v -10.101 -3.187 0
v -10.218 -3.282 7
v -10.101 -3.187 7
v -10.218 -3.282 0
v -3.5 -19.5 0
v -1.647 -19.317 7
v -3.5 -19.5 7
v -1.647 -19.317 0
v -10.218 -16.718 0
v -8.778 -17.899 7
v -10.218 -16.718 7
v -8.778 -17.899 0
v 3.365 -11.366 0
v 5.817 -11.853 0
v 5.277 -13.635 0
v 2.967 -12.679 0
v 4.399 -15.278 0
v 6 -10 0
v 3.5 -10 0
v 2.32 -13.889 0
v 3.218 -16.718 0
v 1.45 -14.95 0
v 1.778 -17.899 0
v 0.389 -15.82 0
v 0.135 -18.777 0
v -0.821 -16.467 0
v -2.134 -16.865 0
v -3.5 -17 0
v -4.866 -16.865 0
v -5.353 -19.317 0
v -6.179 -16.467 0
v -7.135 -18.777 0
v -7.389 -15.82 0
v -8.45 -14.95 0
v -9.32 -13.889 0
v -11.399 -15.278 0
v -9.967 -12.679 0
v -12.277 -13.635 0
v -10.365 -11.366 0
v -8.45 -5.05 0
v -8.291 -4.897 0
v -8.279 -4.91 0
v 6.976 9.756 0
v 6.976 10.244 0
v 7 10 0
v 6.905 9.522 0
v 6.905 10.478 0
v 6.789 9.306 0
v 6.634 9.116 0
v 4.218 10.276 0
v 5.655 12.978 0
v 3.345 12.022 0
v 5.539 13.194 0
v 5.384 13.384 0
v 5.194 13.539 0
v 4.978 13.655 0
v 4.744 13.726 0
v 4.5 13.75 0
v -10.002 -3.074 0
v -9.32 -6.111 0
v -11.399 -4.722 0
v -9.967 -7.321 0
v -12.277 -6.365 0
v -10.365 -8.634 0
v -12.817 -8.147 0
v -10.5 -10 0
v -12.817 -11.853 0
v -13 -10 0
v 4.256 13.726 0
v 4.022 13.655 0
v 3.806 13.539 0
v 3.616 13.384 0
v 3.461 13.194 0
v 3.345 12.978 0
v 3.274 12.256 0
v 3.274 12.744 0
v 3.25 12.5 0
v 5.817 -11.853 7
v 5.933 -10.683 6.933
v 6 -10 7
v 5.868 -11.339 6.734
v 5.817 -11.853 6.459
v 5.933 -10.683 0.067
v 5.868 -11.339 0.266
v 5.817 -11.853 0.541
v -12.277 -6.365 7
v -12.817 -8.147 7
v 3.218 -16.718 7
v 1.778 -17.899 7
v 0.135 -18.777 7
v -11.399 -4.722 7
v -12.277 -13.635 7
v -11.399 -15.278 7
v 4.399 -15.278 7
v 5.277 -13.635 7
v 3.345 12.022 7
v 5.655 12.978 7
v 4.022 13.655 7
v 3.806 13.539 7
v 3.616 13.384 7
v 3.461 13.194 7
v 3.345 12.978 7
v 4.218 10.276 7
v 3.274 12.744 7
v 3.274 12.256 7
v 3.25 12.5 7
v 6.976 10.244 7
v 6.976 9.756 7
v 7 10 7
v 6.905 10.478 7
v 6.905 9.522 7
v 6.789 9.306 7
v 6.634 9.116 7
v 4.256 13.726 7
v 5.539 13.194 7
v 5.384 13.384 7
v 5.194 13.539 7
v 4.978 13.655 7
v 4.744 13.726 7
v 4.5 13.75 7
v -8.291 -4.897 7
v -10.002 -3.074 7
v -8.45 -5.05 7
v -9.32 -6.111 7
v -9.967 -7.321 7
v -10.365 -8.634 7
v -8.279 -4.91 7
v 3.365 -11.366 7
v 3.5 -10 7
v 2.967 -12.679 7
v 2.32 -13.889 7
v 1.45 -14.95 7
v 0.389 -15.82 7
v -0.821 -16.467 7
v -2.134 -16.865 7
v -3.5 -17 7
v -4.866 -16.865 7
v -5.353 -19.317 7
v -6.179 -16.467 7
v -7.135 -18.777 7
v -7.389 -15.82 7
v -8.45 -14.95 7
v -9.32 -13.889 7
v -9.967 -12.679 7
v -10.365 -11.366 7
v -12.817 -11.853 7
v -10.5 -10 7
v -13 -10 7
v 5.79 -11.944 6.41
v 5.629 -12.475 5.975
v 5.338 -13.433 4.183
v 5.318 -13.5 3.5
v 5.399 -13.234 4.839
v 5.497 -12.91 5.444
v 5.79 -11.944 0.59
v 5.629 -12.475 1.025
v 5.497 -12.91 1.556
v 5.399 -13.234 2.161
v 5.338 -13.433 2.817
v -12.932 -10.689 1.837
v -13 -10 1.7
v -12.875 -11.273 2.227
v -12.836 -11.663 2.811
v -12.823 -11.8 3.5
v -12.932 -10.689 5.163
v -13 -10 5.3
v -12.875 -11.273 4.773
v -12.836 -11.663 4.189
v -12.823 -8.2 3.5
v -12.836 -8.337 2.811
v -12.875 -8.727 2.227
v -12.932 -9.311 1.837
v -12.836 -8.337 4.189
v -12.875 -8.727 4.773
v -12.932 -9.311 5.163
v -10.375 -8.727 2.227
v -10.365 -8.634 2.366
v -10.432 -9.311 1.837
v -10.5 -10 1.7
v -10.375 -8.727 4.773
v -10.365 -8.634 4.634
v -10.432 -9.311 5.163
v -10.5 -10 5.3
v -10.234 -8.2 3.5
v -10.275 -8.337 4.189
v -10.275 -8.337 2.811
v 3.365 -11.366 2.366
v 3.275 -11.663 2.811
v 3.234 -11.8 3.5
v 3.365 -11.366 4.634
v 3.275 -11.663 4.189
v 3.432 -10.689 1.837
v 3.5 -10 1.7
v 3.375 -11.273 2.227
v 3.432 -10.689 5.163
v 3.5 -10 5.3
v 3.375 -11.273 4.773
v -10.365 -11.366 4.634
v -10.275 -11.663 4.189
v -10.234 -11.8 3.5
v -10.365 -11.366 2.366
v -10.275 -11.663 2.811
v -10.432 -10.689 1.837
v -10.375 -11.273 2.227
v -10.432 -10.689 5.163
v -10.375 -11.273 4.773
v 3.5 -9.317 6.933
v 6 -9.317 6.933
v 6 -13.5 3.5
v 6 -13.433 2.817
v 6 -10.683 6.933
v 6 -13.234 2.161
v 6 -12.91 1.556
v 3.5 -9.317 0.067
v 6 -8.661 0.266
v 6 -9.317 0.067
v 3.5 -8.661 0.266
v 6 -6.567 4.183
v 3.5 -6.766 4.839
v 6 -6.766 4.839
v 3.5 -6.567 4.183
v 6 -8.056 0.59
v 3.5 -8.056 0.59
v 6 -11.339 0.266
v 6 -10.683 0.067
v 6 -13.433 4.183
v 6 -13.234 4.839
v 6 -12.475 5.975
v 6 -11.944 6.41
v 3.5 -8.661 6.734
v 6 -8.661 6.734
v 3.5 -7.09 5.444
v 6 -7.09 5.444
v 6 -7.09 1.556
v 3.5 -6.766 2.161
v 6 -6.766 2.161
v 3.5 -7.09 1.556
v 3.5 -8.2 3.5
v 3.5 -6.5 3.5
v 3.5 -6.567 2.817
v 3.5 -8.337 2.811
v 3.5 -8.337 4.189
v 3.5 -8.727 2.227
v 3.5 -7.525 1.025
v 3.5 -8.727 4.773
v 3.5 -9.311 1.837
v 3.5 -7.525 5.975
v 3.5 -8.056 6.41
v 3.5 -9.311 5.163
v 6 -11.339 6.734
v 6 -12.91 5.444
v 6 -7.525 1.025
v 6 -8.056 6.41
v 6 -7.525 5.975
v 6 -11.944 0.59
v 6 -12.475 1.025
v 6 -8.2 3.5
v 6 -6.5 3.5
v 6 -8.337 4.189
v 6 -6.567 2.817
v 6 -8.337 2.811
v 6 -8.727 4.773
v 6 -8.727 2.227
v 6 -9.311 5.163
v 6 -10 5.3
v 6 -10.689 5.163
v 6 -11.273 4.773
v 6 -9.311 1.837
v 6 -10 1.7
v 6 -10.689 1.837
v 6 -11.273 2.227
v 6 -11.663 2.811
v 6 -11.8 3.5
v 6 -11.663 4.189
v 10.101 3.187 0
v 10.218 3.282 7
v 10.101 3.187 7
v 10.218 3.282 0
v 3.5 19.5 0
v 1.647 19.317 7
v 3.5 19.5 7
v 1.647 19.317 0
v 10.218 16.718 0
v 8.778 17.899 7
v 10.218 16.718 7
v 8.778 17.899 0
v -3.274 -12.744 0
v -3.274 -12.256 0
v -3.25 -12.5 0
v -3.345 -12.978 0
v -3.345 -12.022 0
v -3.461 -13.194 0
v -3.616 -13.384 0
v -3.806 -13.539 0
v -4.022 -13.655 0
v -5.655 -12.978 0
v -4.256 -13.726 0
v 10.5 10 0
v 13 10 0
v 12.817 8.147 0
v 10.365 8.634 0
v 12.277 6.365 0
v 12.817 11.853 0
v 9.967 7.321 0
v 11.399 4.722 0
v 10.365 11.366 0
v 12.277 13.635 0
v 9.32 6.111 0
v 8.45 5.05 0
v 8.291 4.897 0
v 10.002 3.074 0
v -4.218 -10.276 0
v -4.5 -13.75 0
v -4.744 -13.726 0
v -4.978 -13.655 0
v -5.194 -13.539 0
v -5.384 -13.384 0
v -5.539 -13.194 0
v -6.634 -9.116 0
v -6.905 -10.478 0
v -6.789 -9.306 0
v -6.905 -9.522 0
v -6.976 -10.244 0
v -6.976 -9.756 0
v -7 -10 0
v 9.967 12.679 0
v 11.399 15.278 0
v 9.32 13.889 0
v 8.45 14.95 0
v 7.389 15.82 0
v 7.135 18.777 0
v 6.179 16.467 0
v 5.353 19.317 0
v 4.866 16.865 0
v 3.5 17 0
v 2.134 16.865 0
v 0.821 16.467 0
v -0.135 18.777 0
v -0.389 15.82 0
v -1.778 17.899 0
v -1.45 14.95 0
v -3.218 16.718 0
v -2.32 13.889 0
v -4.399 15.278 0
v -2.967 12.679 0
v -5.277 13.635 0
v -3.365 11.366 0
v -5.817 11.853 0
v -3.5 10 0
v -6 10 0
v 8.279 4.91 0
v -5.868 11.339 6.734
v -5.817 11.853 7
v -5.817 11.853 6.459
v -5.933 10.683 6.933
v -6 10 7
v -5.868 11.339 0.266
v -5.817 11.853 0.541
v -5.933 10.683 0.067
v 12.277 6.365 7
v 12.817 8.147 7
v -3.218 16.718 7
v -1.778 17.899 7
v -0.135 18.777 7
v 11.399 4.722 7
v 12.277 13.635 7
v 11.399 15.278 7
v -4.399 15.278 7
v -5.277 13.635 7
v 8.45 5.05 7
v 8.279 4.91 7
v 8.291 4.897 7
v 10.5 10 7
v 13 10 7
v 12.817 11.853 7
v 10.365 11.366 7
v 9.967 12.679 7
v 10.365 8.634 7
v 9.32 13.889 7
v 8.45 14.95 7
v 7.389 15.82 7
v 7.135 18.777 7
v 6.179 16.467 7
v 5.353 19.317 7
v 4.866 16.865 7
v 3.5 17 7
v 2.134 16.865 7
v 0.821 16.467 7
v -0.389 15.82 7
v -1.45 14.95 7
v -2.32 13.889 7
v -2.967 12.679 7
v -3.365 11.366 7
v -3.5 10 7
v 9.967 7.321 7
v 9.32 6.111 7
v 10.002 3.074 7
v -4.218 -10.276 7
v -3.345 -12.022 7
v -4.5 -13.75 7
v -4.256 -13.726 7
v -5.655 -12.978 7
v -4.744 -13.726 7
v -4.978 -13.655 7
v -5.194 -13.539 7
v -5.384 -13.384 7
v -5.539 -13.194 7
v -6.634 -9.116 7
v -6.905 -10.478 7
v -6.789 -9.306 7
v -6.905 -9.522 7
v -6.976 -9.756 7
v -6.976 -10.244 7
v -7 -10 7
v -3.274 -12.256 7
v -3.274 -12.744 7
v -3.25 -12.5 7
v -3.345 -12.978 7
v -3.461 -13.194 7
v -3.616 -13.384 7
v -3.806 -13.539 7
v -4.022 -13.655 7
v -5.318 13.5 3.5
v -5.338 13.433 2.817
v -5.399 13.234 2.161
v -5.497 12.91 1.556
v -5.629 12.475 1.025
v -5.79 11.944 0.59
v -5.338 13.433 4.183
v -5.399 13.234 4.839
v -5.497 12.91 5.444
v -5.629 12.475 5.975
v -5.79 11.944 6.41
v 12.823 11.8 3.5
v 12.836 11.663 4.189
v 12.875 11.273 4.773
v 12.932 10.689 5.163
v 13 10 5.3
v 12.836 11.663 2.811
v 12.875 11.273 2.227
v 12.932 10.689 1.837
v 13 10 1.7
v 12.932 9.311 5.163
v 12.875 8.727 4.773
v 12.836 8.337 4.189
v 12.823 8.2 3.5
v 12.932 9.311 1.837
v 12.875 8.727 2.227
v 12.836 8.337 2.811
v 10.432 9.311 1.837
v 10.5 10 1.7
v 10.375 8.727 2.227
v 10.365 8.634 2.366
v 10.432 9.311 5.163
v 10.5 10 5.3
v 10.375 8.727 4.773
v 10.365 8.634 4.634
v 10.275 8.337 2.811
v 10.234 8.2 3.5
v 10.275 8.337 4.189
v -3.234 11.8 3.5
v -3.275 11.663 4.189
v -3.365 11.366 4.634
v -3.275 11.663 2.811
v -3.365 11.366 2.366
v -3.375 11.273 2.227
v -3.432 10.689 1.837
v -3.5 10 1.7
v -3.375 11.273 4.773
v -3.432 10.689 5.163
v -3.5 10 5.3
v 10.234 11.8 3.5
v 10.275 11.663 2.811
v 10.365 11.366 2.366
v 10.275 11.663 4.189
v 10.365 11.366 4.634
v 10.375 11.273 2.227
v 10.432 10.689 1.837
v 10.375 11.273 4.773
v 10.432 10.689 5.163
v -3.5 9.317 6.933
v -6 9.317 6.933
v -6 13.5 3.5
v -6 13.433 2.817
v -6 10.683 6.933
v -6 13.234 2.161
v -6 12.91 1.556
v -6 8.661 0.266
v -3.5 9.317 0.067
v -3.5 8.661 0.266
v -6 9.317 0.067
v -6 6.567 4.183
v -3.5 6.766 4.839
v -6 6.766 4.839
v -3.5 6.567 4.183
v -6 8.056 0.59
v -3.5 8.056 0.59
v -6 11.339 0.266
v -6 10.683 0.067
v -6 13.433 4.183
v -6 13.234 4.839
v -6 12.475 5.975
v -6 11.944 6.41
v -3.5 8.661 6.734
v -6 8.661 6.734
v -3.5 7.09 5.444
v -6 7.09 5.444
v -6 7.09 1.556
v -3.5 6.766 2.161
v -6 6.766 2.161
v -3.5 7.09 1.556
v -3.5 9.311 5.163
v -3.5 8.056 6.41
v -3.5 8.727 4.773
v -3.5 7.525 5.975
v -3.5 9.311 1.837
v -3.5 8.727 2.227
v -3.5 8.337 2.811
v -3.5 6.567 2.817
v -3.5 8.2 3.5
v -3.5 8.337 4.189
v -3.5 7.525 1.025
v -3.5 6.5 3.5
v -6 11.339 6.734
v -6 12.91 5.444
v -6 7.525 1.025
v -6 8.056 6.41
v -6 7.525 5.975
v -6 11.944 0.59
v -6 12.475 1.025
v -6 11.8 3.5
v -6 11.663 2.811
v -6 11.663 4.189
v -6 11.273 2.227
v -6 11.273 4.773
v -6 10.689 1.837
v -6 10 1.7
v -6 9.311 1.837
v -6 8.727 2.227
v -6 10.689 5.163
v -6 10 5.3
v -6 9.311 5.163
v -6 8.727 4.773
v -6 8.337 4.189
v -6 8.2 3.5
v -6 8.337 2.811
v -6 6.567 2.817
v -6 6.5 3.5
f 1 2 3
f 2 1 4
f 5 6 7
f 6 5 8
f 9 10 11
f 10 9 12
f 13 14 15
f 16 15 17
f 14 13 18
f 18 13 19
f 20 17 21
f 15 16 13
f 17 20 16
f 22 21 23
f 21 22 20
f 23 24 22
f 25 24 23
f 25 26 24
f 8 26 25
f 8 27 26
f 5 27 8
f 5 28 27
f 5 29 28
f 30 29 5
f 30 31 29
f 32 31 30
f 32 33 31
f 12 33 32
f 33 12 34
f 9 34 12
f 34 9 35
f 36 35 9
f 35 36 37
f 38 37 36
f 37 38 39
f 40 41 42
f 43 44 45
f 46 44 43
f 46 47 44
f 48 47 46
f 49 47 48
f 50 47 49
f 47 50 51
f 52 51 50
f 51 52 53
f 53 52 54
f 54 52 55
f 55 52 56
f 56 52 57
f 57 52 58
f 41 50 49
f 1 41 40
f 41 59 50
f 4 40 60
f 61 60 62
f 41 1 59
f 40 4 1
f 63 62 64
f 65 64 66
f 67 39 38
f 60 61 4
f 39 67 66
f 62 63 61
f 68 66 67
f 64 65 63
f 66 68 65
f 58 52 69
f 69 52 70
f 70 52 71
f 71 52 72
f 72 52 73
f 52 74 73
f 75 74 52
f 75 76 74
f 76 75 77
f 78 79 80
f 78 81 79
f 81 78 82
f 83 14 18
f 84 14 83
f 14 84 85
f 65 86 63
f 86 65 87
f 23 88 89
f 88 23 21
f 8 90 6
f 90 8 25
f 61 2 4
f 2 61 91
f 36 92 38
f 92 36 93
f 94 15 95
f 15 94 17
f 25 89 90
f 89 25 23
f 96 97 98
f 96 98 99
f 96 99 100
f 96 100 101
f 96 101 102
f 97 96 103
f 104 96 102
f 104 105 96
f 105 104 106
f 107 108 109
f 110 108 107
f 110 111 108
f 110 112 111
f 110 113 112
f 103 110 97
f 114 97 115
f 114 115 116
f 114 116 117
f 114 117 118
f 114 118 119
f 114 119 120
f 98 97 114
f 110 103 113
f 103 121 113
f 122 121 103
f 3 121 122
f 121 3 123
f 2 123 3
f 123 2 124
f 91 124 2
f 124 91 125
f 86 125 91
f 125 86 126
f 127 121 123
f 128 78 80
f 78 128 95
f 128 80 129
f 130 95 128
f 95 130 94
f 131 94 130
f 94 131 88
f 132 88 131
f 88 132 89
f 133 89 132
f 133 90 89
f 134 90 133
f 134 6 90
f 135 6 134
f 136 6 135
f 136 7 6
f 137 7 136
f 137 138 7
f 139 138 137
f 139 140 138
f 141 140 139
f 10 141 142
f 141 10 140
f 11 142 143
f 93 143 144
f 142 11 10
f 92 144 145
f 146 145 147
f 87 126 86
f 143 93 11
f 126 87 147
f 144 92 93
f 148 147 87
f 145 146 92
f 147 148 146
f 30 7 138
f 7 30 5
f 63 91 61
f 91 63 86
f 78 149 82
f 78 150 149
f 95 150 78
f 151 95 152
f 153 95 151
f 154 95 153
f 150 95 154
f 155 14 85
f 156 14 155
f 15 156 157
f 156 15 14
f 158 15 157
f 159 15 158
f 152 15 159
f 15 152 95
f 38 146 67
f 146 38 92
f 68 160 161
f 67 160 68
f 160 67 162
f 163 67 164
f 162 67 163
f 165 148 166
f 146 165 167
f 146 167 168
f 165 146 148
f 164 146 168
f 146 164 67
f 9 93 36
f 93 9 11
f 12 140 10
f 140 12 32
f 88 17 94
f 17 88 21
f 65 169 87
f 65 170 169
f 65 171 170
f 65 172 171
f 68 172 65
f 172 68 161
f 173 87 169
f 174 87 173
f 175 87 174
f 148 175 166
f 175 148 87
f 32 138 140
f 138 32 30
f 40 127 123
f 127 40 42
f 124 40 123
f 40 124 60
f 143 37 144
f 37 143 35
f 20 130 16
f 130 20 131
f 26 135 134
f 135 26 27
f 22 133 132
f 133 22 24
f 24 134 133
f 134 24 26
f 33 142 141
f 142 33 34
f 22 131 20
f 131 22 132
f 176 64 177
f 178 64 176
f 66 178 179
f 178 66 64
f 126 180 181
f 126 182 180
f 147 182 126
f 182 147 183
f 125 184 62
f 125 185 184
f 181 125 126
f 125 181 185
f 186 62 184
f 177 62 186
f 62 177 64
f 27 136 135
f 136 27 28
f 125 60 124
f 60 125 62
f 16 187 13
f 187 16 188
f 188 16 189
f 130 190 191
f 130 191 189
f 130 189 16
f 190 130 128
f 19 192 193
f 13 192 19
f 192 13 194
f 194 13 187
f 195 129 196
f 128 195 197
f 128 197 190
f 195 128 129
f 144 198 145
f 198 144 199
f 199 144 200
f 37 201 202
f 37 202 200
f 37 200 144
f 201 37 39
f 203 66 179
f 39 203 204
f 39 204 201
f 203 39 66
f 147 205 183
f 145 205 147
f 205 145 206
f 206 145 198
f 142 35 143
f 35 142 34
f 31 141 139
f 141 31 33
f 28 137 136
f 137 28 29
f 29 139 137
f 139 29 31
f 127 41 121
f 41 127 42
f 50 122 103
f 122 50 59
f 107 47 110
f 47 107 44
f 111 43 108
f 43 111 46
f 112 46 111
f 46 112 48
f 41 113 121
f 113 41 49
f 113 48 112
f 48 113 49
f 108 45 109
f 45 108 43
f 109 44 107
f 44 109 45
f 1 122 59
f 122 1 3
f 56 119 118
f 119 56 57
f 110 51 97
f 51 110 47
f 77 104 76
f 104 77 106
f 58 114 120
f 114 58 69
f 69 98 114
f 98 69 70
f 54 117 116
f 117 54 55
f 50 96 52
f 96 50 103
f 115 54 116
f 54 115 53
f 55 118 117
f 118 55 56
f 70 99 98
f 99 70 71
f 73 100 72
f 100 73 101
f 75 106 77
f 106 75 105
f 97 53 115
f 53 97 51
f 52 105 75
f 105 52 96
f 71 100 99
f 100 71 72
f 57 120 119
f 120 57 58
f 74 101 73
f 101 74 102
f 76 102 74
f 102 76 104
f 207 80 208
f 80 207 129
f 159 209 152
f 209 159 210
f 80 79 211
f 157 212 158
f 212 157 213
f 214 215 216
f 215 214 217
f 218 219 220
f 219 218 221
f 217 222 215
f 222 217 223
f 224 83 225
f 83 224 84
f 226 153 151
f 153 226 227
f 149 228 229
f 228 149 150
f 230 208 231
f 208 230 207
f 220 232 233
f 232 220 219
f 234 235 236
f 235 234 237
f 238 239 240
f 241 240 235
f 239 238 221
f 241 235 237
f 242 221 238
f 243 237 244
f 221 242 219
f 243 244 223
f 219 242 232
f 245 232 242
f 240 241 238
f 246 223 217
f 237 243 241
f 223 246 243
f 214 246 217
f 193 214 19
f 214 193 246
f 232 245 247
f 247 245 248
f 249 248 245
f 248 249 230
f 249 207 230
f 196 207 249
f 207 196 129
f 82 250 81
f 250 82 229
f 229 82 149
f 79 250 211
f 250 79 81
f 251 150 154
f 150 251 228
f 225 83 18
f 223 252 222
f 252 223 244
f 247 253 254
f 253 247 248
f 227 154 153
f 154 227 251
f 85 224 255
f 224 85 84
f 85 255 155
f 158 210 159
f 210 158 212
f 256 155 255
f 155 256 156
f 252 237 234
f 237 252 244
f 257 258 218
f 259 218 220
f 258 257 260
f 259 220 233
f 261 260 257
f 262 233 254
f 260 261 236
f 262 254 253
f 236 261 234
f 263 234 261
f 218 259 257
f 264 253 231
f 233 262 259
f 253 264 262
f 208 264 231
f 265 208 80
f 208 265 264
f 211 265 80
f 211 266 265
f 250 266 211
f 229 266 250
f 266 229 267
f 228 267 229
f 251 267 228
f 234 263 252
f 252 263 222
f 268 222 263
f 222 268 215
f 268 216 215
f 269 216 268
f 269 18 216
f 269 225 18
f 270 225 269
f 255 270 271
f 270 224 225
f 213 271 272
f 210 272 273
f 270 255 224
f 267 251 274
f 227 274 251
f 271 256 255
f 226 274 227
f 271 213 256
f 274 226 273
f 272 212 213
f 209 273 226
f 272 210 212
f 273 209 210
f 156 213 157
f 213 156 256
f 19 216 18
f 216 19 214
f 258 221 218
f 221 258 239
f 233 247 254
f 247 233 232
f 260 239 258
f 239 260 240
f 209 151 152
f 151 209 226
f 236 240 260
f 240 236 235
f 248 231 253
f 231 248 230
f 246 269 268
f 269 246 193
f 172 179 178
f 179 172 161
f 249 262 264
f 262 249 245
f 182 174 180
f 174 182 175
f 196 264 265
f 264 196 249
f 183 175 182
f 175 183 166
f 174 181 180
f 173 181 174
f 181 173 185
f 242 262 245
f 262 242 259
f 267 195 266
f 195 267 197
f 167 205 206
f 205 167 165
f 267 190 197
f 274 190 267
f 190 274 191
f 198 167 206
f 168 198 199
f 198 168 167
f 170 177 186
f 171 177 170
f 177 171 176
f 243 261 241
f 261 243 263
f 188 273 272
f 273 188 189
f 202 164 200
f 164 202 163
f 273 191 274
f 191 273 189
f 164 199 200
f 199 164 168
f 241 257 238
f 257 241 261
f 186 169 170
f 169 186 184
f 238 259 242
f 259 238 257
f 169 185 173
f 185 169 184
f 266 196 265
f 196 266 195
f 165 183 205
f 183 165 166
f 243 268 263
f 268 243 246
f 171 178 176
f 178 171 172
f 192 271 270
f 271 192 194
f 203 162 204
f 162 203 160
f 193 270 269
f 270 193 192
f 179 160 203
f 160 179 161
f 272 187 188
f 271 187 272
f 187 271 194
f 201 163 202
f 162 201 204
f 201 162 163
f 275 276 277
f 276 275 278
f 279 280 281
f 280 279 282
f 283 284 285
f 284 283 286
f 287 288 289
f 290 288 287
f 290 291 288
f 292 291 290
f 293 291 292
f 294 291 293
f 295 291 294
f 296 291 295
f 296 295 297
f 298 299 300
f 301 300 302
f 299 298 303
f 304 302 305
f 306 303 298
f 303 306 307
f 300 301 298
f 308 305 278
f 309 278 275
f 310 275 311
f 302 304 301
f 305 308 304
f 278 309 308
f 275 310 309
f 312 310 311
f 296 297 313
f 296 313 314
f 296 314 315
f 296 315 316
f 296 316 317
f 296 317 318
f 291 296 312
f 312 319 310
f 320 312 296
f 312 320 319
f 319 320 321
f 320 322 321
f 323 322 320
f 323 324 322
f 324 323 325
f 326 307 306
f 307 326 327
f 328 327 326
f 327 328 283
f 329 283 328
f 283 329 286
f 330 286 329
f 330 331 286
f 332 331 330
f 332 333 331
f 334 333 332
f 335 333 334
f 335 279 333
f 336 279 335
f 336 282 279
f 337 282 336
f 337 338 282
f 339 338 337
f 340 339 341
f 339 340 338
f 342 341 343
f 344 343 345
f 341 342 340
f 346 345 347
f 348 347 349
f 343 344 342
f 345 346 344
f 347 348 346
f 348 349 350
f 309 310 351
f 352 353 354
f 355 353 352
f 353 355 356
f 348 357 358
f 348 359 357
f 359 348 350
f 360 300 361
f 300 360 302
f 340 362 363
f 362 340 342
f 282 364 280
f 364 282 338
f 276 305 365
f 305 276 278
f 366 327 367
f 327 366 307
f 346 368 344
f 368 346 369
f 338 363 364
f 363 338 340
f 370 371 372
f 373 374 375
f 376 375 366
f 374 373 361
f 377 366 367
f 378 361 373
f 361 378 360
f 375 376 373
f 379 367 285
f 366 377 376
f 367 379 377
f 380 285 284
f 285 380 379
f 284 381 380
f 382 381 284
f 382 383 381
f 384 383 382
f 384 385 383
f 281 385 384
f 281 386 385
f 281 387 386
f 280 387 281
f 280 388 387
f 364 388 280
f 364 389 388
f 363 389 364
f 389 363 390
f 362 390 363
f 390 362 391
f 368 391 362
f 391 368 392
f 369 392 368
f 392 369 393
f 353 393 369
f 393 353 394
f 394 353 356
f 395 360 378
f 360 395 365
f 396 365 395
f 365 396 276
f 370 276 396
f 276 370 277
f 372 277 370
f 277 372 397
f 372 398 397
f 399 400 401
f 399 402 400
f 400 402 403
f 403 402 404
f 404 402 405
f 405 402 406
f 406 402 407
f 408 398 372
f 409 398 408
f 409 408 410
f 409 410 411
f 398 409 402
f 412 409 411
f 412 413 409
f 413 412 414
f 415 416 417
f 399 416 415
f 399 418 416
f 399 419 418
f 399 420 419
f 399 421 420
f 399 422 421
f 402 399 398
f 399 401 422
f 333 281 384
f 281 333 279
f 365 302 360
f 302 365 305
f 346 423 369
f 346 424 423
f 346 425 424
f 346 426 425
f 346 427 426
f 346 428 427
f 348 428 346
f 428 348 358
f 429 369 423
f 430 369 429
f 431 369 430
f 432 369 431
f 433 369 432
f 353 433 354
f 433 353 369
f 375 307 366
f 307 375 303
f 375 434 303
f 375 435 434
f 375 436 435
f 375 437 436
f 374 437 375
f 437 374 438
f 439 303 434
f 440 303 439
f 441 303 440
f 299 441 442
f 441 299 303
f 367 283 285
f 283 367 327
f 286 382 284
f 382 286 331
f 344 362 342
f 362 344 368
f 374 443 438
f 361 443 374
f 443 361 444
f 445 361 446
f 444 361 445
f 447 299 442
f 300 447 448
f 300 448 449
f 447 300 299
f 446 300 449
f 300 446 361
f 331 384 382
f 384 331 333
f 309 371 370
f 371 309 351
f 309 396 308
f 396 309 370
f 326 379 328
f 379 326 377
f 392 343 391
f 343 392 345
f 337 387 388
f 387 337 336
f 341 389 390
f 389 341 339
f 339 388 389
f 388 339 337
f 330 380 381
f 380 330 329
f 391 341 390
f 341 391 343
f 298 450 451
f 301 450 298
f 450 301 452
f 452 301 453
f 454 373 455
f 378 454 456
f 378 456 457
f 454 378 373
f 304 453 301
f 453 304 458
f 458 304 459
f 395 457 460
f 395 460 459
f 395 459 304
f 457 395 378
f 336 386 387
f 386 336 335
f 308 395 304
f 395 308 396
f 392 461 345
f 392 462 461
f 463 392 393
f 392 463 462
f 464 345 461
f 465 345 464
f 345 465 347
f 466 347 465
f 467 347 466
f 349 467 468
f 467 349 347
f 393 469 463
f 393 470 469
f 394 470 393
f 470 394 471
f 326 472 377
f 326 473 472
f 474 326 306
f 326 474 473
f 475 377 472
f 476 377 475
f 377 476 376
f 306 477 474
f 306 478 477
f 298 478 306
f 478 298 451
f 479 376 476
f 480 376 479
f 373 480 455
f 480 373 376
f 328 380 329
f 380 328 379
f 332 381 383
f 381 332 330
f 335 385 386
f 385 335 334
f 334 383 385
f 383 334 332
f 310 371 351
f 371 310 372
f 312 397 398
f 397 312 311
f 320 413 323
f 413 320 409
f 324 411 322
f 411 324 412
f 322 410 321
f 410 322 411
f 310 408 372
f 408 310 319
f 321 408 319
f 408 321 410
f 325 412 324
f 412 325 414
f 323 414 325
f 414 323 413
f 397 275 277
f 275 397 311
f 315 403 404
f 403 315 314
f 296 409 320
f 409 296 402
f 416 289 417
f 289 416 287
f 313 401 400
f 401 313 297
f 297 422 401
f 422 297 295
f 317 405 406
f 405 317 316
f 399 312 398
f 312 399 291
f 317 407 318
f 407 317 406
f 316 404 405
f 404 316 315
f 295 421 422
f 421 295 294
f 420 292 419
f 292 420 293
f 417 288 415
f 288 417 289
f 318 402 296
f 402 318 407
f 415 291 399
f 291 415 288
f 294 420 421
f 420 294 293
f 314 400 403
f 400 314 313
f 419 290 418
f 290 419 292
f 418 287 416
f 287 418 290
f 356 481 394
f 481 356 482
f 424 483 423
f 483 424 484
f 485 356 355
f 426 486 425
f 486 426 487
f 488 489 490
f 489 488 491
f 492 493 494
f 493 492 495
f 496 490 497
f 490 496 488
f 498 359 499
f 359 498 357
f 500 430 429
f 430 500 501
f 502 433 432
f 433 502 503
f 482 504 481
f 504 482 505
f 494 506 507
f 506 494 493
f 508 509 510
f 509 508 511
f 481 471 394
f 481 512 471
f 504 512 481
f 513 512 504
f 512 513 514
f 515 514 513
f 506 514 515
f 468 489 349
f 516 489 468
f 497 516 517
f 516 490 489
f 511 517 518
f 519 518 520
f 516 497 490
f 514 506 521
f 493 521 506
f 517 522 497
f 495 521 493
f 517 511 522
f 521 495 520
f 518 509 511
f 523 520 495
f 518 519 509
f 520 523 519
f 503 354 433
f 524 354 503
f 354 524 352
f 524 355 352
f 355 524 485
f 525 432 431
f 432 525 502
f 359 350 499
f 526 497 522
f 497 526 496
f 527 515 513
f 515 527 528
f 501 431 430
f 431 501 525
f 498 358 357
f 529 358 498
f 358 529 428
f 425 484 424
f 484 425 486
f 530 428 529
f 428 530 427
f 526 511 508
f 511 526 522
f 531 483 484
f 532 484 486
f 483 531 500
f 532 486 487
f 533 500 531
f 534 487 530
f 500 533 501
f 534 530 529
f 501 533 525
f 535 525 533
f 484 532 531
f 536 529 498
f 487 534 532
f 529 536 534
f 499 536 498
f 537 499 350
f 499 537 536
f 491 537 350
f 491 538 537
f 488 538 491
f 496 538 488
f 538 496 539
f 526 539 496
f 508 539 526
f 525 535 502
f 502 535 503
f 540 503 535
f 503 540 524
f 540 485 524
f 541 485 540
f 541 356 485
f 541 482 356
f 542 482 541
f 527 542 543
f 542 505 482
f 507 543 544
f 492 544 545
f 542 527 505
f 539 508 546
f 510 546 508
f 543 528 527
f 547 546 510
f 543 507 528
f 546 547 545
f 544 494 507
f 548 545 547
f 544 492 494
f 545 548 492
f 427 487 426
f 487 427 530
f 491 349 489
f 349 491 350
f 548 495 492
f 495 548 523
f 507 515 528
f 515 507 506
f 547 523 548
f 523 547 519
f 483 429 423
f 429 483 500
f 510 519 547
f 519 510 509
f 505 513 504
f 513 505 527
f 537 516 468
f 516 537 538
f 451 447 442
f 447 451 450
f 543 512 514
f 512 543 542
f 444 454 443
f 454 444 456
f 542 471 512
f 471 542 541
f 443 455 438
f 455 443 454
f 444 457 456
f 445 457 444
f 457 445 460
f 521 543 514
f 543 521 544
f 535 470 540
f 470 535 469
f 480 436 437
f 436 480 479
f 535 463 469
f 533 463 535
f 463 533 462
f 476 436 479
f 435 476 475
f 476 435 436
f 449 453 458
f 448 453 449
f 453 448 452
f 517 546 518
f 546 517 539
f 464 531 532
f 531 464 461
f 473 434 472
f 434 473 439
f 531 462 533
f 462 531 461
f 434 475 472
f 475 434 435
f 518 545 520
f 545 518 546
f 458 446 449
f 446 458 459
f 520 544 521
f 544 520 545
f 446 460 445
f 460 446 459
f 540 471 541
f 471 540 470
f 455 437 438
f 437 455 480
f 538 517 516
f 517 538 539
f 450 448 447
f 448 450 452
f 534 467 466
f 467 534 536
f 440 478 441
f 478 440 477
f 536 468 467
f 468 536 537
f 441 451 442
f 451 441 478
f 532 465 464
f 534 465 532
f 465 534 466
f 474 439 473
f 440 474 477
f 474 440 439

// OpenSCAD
/******************************************************************
*                                                                 *
* OpenFlexure Microscope: Optics unit                             *
*                                                                 *
* This is part of the OpenFlexure microscope, an open-source      *
* microscope and 3-axis translation stage.  It gets really good   *
* precision over a ~10mm range, by using plastic flexure          *
* mechanisms.                                                     *
*                                                                 *
* (c) Richard Bowman, January 2016                                *
* Released under the CERN Open Hardware License                   *
*                                                                 *
******************************************************************/


use <utilities.scad>;

//this is for mini culture plates, 39mm outer diameter and 12.4mm high
sample=[0,19/2,12.4-1.5-9]; //position of clamping point relative to bolt

$fn=32;


//rotate([0,90,0]) 
module sample_clip(sample,t=2.5,w=6,roc=-1,slope=30){
    roc = roc>0 ? roc : sample[2]/2 + sample[1]*sin(slope) - t/2; //radius of curvature
    a = sqrt(pow(sample[1], 2) + pow(sample[2] - roc - t/2, 2));
      //a is the distance from the contact-point cylinder to the 
      //centre of the curved part
    angle = acos( (roc + t/2) / a ) + atan((sample[2] - roc - t/2)/sample[1]); //angle through which we must rotate the join between
    //curved part and straight part
    echo("angle set to:",angle);
    /*angle = 75; //angle of straight part to the vertical
    roc =*/ 
    difference(){
        union(){
            //anchor to stage
            hull() repeat([sample[0],0,0],2) cylinder(r=w/2,h=t);
            
            translate([0,0,roc+t]) rotate([0,90,0]) difference(){
                cylinder(r=roc+t,h=w,center=true);
                cylinder(r=roc,h=999,center=true);
                translate([0,0,-99]) rotate(0) cube([999,999,999]);
                translate([0,0,-99]) rotate(angle) cube([999,999,999]);
            }
            sequential_hull(){
                translate([0,0,roc+t]) rotate([0,90,0]) rotate(angle) translate([0,roc+t/2,0]) cylinder(r=t/2,h=w,center=true);
                translate([0,sample[1],sample[2]+t/2]) rotate([0,90,0]) cylinder(r=t/2,h=w,center=true);
                translate([0,sample[1]+t,sample[2]+t]) rotate([0,90,0]) cylinder(r=t/2,h=w,center=true);
            }
            
        }
        cylinder(r=3/2*1.2,h=999,center=true,$fn=16);
    }
}


//this is for mini culture plates, 39mm outer diameter and 12.4mm high
//sample_clip([0,19/2+3,12.4-1.5],slope=7.5); //mini culture dish

//for a standard microscope slide, use [0,20,0] to clamp from both holes next to one leg
for(a=[0,180]) rotate([0,-90,a]) translate([7/2,-10,-7+1])
sample_clip([0,20,-1], w=7, roc=7); //microscope slide
/*
translate([10,0,0]) sample_clip([0,20,0]);
translate([20,0,0]) sample_clip([0,20,10]);
translate([30,0,0]) sample_clip([0,10,3]);
translate([40,0,0]) sample_clip([0,10,15]);
*/
